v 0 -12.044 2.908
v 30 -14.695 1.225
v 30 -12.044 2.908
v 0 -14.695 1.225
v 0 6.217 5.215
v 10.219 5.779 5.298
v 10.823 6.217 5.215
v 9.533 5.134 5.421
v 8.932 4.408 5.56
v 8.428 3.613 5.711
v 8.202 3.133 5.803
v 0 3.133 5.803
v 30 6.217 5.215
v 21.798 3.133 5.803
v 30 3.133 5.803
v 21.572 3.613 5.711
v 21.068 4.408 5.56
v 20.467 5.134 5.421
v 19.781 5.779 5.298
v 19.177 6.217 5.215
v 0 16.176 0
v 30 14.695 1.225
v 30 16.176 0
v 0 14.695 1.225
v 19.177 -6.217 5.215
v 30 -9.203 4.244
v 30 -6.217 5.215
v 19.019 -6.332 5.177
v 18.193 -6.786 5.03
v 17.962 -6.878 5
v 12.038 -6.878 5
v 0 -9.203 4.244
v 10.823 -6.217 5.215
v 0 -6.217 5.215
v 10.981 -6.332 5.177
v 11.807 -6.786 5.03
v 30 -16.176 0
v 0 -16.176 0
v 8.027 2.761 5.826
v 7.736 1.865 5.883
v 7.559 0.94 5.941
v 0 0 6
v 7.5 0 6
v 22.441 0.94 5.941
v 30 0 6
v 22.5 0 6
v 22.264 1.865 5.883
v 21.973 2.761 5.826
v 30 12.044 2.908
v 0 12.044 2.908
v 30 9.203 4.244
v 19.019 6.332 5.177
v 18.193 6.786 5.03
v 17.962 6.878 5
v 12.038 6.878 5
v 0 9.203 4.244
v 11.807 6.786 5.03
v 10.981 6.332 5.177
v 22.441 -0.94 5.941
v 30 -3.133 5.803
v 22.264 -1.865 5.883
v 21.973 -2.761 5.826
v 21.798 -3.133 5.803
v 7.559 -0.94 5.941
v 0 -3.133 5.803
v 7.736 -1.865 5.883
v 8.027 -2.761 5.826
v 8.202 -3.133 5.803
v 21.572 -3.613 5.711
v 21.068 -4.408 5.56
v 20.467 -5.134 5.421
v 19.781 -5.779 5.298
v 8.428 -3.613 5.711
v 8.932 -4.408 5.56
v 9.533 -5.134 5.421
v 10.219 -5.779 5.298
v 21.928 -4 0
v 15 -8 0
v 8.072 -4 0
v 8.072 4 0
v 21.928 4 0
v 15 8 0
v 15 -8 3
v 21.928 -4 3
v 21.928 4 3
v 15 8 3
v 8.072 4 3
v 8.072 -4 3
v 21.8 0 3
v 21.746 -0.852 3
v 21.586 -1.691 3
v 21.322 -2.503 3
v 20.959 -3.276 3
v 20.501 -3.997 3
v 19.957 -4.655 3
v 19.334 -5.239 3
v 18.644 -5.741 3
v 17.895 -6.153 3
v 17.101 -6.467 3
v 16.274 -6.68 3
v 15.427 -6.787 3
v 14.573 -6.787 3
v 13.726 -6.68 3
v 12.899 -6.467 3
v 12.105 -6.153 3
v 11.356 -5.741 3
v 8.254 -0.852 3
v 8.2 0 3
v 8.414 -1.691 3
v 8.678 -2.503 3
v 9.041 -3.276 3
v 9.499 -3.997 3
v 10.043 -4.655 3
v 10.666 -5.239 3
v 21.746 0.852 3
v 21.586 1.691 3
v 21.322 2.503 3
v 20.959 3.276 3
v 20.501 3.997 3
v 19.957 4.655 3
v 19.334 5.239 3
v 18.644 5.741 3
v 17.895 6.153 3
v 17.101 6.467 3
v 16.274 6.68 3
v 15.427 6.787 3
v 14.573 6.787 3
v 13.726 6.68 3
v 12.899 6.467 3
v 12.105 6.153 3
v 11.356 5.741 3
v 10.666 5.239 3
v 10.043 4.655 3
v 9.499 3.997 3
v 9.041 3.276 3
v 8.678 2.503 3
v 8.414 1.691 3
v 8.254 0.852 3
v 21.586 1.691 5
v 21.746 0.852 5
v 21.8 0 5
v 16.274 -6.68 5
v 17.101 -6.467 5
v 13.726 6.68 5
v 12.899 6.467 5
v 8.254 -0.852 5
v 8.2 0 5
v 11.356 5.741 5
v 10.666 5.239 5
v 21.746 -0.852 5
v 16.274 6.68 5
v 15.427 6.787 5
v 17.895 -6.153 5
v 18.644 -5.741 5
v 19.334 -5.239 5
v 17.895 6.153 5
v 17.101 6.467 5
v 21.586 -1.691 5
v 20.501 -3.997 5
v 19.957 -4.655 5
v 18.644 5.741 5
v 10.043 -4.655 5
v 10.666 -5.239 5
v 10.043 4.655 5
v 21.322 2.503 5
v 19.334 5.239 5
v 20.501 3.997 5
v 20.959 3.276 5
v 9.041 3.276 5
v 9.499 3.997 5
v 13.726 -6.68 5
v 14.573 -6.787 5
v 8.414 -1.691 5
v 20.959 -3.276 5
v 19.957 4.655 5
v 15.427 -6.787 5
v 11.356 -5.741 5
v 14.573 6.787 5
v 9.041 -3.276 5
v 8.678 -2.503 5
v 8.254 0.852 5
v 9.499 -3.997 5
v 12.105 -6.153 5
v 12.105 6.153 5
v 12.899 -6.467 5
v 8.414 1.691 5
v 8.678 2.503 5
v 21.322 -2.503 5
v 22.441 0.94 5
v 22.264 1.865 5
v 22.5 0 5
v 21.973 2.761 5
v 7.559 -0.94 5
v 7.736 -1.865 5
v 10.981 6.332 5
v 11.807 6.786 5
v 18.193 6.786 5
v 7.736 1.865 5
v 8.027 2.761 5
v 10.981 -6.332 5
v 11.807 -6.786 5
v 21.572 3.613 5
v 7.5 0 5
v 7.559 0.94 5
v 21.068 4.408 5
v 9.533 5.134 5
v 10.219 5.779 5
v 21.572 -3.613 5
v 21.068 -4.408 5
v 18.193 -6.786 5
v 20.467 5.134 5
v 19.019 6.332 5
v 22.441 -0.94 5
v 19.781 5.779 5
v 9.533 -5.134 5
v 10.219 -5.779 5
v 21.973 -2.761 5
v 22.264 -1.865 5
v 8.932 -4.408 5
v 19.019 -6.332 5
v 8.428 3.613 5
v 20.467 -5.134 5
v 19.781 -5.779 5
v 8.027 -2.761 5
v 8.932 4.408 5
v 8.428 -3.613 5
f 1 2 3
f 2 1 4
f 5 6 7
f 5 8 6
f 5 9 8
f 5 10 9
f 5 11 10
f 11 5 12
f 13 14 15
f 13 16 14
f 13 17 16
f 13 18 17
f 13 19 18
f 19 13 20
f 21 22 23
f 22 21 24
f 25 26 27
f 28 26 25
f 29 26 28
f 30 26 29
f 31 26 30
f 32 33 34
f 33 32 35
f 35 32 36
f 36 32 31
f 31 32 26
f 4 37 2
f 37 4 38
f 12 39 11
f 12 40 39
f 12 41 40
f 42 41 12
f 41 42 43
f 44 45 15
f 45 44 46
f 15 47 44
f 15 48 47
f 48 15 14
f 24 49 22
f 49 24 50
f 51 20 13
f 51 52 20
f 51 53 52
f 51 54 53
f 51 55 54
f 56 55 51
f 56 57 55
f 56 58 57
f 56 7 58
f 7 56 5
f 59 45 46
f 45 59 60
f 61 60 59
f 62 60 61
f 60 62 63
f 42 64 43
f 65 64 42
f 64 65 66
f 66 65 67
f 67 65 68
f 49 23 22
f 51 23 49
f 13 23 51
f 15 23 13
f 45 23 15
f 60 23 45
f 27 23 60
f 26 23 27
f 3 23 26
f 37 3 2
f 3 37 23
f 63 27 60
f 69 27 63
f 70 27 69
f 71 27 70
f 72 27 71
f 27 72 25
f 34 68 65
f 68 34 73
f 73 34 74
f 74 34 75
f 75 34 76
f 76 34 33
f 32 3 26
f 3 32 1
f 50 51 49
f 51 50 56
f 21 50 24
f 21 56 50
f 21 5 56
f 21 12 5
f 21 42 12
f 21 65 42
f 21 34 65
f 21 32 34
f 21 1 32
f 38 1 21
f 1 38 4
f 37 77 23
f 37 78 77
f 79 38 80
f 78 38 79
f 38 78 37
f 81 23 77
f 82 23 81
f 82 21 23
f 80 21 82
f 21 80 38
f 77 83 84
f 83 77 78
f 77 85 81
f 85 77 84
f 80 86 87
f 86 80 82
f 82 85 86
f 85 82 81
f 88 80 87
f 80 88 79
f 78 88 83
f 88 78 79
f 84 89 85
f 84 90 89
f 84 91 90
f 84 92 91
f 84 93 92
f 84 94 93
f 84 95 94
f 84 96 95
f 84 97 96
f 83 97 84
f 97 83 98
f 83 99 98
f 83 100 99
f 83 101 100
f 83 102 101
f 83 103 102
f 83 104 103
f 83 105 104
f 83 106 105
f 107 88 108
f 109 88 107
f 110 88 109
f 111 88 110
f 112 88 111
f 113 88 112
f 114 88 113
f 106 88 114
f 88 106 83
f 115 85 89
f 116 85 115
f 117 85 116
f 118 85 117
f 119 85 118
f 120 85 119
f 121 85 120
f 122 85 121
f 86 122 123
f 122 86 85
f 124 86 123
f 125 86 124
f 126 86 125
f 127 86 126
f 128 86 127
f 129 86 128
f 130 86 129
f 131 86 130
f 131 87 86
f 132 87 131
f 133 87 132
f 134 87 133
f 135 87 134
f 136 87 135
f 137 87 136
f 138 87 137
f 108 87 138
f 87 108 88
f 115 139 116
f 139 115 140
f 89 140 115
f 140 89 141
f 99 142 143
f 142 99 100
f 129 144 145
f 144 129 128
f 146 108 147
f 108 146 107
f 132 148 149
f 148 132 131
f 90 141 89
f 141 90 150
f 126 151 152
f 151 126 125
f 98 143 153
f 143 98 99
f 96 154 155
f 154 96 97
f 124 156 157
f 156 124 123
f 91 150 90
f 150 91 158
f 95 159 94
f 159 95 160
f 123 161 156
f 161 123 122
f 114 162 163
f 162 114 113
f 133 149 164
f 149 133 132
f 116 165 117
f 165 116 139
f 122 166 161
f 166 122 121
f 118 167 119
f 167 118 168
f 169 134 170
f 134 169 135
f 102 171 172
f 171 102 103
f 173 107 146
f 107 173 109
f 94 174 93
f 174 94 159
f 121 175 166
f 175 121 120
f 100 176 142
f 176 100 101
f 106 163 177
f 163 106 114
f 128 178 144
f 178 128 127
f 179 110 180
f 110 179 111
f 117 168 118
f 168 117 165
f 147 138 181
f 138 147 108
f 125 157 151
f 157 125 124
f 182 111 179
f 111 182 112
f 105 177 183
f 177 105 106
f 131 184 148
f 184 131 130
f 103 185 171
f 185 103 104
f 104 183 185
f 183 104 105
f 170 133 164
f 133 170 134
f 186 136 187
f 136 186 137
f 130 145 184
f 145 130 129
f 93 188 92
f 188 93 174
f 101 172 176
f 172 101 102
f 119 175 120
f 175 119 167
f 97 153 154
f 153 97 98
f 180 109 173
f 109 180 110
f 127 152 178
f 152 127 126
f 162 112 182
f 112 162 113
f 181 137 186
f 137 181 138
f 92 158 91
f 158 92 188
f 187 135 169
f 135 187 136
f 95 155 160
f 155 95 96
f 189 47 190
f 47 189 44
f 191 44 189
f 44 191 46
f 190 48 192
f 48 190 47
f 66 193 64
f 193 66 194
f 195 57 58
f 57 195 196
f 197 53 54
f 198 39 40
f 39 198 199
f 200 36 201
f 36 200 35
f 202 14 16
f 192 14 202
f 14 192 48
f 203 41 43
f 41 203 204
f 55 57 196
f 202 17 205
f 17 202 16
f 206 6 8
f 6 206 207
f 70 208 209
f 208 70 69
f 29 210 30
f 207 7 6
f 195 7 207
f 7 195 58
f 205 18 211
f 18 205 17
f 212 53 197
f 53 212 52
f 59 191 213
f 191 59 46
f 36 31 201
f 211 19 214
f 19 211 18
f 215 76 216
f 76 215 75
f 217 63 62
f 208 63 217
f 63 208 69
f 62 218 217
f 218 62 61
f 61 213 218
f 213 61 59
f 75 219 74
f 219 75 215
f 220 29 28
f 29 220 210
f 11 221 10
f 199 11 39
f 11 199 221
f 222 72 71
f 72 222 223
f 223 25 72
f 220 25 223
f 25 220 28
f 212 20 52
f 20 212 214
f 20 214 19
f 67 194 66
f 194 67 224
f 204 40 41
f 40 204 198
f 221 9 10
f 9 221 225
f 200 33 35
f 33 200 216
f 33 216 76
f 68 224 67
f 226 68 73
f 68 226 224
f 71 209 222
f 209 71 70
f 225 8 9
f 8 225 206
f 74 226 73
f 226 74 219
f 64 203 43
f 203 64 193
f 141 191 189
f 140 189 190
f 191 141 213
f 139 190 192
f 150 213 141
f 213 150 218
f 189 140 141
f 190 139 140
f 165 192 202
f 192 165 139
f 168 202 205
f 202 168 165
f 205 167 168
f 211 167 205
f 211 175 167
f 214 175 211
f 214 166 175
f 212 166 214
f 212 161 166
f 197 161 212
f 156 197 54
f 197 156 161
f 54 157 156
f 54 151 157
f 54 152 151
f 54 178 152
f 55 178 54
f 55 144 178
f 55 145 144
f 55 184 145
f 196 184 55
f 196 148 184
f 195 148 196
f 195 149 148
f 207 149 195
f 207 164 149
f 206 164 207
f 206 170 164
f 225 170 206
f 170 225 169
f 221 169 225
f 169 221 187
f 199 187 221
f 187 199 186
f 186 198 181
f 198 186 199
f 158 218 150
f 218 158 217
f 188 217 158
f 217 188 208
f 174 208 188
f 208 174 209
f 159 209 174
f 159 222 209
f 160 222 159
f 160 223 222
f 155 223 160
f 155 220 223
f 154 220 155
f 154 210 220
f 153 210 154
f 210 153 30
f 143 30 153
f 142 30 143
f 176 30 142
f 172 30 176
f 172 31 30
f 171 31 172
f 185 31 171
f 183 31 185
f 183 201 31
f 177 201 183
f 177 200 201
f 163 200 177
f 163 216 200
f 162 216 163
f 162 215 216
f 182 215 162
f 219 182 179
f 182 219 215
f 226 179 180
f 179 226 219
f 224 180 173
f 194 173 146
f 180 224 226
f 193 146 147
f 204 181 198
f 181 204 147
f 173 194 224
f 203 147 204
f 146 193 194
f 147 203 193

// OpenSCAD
$fn = 50;

pipe_diameter = 50;
holder_length = 
30;
holder_height = 6;

nut_diameter = 16;
nut_hole_height = holder_height/2;

pb_hole_diameter = 13.6;
top_oring_diameter = 15;
top_oring_depth = 1;

curve_radius = pipe_diameter/2;

difference(){
    
translate([0,0,-(curve_radius-holder_height)]) difference() {
    rotate([0 ,90, 0]) cylinder( r = curve_radius, h = holder_length);
    translate([0,-curve_radius,-curve_radius]) cube( size = [holder_length, pipe_diameter, pipe_diameter-holder_height]);
}

translate([holder_length/2,0,0]) {
    rotate([0,0,30])cylinder( r=nut_diameter/2, h = nut_hole_height, $fn=6);
    cylinder( r = pb_hole_diameter/2,h = holder_height);
    translate([0,0,holder_height-top_oring_depth])
    cylinder( r = top_oring_diameter/2,h = top_oring_depth);
}
}
